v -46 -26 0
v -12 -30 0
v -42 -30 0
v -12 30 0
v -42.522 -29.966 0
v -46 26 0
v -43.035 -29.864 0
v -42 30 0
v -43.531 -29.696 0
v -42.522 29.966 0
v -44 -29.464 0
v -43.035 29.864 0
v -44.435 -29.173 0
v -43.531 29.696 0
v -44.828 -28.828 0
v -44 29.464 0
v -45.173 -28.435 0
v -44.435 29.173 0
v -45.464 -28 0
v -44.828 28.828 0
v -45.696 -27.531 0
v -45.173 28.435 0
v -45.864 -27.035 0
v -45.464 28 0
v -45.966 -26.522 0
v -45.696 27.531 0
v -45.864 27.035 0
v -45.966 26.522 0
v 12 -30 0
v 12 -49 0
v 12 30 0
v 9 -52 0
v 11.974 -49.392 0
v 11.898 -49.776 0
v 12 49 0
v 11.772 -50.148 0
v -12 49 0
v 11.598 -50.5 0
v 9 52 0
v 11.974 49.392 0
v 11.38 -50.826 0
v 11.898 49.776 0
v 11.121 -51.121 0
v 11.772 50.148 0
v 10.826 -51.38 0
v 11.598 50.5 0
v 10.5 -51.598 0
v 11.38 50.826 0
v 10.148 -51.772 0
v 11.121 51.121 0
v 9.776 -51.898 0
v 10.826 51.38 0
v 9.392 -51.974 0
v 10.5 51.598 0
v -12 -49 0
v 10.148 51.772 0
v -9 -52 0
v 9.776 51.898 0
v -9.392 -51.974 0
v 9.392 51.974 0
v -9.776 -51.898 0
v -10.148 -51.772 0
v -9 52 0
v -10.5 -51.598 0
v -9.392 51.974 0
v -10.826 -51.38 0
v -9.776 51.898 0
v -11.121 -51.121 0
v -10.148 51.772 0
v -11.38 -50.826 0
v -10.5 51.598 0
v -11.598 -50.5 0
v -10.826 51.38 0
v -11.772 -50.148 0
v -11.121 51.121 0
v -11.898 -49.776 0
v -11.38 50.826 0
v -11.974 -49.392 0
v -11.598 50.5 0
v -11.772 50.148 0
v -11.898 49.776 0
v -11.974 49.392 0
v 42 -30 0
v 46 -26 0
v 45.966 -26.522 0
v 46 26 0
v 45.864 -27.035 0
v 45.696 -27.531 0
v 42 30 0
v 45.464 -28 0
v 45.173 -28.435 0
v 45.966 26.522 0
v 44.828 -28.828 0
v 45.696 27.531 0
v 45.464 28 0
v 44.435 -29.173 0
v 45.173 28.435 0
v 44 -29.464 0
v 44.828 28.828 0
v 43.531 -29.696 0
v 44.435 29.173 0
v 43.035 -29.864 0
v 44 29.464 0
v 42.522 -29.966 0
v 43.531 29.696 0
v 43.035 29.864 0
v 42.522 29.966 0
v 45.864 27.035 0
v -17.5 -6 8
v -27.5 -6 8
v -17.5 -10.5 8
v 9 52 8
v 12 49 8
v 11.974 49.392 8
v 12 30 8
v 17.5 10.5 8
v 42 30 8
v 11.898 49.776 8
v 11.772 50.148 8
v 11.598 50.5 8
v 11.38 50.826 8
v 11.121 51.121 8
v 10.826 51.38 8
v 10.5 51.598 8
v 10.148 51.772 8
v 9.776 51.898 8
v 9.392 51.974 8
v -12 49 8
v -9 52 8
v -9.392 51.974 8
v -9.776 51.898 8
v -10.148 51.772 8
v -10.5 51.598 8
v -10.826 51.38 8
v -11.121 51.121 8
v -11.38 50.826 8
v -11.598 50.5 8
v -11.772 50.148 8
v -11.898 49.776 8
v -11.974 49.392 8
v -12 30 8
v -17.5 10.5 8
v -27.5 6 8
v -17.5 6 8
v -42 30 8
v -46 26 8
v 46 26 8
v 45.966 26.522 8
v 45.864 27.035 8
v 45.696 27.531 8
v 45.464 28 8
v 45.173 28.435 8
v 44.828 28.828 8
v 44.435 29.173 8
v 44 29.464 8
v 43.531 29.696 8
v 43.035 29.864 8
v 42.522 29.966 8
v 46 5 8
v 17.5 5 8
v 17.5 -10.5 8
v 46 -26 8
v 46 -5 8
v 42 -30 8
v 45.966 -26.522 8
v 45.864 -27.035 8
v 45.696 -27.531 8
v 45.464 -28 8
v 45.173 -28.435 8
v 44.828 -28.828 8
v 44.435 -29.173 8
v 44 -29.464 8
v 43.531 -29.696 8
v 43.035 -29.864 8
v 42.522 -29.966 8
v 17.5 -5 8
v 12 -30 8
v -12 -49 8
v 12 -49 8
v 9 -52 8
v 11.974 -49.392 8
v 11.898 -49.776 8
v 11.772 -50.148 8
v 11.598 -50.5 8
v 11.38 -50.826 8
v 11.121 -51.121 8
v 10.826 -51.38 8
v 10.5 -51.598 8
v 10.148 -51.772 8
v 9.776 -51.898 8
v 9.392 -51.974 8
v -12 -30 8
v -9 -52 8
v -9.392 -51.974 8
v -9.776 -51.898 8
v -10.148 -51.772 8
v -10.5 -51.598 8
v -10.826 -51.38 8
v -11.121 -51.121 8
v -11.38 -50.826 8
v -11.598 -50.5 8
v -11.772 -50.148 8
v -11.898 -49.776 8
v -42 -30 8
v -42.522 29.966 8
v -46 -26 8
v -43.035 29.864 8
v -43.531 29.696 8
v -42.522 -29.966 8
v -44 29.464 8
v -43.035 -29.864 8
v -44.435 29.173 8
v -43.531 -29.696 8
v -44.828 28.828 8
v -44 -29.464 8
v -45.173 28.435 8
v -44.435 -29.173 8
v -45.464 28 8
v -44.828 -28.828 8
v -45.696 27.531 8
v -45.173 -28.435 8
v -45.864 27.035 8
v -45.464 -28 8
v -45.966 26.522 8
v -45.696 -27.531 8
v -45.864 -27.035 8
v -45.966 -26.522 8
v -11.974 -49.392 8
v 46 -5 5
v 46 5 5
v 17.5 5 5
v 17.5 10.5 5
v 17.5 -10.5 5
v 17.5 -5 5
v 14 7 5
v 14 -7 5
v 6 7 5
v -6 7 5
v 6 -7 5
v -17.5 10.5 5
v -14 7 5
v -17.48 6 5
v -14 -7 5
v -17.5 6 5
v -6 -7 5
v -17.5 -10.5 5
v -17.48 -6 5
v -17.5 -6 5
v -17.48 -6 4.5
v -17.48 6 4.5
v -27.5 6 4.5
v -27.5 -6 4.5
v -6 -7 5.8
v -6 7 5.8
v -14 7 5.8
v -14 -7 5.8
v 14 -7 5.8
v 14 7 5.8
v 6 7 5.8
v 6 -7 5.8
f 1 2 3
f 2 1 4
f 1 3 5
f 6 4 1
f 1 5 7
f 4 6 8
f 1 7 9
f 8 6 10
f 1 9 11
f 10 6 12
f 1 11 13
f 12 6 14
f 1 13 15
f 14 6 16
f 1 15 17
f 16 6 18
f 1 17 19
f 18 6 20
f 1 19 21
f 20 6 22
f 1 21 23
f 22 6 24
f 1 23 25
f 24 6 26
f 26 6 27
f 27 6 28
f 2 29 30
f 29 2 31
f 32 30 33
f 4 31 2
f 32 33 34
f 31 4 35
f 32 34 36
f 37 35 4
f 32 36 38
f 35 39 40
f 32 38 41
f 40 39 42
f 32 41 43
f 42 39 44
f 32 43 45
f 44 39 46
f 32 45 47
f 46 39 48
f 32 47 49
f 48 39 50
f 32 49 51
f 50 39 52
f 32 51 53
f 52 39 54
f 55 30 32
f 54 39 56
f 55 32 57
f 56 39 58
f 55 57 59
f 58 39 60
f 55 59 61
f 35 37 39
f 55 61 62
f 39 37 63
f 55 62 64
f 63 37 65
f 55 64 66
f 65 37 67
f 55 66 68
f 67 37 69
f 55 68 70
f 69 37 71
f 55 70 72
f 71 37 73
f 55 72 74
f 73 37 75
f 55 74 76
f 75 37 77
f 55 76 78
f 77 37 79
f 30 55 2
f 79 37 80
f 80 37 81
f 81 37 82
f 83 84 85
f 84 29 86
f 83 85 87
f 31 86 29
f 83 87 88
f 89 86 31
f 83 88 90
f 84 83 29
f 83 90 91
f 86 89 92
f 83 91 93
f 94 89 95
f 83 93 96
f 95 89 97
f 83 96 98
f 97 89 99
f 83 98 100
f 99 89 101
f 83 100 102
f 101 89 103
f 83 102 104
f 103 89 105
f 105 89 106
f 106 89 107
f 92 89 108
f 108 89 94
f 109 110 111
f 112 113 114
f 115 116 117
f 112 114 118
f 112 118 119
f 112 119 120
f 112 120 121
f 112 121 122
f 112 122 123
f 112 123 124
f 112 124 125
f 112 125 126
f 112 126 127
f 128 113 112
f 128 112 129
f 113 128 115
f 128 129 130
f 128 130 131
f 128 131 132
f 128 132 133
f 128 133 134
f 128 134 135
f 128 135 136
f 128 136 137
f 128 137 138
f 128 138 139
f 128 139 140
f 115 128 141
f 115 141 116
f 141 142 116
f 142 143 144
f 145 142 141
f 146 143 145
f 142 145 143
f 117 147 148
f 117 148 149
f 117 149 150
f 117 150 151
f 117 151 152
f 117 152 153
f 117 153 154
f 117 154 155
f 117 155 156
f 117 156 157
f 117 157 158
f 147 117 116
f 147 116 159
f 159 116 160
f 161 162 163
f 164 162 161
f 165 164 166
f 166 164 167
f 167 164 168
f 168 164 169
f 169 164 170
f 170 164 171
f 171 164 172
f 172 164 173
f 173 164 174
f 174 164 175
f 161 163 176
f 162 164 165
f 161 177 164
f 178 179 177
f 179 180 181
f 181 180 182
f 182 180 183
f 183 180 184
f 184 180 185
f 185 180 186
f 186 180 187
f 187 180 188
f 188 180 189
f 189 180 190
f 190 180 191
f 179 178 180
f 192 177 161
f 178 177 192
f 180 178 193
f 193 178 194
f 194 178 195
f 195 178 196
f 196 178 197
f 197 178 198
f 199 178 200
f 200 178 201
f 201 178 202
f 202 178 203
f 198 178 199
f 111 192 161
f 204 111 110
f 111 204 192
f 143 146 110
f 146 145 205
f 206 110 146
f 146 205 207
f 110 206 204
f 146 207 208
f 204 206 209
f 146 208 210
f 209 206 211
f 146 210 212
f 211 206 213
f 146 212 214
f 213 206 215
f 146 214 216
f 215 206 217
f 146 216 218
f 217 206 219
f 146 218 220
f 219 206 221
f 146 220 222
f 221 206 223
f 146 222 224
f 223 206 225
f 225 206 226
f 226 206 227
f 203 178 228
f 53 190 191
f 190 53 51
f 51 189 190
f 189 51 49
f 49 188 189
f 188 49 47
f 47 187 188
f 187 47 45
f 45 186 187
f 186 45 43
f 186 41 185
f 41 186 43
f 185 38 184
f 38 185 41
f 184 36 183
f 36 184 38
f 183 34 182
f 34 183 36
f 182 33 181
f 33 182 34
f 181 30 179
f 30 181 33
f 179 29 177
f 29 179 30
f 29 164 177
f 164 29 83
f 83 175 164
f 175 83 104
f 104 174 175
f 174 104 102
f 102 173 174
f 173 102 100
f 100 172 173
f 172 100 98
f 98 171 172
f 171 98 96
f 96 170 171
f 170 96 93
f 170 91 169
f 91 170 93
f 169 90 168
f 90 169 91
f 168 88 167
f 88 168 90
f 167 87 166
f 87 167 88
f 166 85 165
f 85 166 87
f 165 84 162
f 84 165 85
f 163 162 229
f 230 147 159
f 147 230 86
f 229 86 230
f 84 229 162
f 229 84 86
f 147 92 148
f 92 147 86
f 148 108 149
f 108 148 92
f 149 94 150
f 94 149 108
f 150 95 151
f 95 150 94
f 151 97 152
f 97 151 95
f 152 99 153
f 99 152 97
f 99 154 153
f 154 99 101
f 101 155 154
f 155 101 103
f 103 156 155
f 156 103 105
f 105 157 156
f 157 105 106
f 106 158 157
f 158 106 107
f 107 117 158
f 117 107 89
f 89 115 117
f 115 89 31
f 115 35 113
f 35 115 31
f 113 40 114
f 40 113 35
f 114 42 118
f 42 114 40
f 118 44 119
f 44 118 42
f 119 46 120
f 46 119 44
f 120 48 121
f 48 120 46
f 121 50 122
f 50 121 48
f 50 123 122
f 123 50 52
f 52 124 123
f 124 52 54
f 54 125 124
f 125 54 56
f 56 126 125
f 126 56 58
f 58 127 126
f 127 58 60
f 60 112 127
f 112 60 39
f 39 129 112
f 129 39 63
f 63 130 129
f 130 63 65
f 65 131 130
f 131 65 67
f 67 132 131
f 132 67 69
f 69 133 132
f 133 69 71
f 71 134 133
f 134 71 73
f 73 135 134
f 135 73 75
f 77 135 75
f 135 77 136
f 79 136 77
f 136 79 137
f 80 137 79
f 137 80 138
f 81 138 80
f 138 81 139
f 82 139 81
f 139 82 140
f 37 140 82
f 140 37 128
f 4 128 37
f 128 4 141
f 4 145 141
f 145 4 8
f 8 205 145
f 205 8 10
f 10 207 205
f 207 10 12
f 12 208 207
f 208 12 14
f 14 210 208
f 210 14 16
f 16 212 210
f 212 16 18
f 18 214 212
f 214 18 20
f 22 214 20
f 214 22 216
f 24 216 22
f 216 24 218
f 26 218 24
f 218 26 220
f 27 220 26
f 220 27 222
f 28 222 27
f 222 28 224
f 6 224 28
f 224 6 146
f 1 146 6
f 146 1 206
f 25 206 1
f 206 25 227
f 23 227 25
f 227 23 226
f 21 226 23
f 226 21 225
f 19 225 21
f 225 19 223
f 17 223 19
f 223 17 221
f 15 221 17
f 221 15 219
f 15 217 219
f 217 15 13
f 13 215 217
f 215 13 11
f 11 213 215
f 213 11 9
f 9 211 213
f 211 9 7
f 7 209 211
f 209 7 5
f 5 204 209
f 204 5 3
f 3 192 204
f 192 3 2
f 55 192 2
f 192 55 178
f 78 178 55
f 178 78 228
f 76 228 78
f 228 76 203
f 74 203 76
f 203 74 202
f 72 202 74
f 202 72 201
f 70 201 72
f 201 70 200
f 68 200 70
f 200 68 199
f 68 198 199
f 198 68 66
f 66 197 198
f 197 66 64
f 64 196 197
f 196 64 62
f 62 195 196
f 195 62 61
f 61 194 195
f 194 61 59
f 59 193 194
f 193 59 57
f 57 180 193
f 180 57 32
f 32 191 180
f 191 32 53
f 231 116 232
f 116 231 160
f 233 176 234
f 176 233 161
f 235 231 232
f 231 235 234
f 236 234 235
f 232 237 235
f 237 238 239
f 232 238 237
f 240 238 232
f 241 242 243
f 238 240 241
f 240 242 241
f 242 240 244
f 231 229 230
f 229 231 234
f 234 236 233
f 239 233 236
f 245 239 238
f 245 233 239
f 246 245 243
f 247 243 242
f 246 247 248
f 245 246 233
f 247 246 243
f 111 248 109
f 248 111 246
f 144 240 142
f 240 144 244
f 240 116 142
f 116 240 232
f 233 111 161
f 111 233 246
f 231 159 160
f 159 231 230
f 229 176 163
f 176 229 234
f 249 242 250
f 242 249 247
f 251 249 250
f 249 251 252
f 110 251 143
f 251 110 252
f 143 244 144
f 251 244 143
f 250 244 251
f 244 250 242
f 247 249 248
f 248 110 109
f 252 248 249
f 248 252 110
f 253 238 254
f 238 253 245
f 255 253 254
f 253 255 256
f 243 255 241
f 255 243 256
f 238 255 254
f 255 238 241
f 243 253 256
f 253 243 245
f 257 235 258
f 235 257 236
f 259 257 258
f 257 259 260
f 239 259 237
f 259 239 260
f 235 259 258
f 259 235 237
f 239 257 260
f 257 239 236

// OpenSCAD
// Original shallow bench fixture; all dimensions in mm.
// Defaults are UNMEASURED example geometry, not a keystone compatibility claim.
part = "nest"; // [nest, contact_coupon]
base_length = 92;
base_width = 60;
base_thickness = 8;
base_radius = 4;
jack_length = 34;
jack_width = 20;
recess_depth = 3;
recess_clearance = 0.5; // Per side, loose location only.
support_land_width = 8; // X dimension of each raised bearing land.
support_land_length = 14; // Y dimension; both lands centered on Y=0.
support_land_spacing = 20; // X center-to-center separation.
support_land_height = 0.8;
cable_exit_width = 10;
latch_relief_width = 12;
latch_relief_length = 10; // Beyond the -X recess edge.
latch_relief_extra_depth = 0.5;
ear_width = 24; // X dimension.
ear_projection = 22; // Beyond each +/-Y edge of base.
ear_overlap = 8; // Join inside base; no holes or captive hardware.
ear_radius = 3;
clamp_pad_length = 14; // Actual pad X envelope, including pad articulation.
clamp_pad_width = 12; // Actual pad Y envelope.
clamp_pad_margin = 1;
coupon_length = 50;
coupon_width = 32;
// Measured lowest tool/hand working envelope above the bearing surface.
// The whole actual swept tool envelope must clear every fixture feature.
tool_bottom_above_support = 8;
tool_envelope_length = 40;
tool_envelope_width = 30;
minimum_floor = 3;
minimum_wall = 4;
minimum_land_width = 6;
minimum_land_length = 12;
minimum_ear_join = 4;
minimum_access_gap = 1;
$fn = 48;

cut_epsilon = 0.02;
recess_length = jack_length + 2 * recess_clearance;
recess_width = jack_width + 2 * recess_clearance;
floor_z = base_thickness - recess_depth;
support_z = floor_z + support_land_height;
ear_length = ear_projection + ear_overlap;

assert(part == "nest" || part == "contact_coupon", "part must be nest or contact_coupon");
assert(base_length > 0 && base_width > 0 && base_thickness > 0,
    "base dimensions must be positive");
assert(minimum_floor >= 3 && minimum_wall >= 4 && minimum_land_width >= 6 &&
    minimum_land_length >= 12 && minimum_ear_join >= 4 && minimum_access_gap >= 1,
    "minimum structural and access guards cannot be reduced");
assert(base_radius > 0 && base_radius < min(base_length, base_width) / 2,
    "base radius must preserve a straight-sided base");
assert(jack_length > 0 && jack_width > 0 && recess_depth > 0,
    "jack envelope and recess depth must be positive");
assert(recess_clearance > 0 && recess_clearance <= 2,
    "recess clearance must be positive and at most 2 mm per side");
assert(floor_z >= minimum_floor && floor_z - latch_relief_extra_depth >= minimum_floor,
    "recess and latch relief must preserve minimum floor");
assert(recess_length + 2 * (minimum_wall + base_radius) <= base_length &&
    recess_width + 2 * (minimum_wall + base_radius) <= base_width,
    "recess must preserve broad perimeter walls");
assert(support_land_width >= minimum_land_width && support_land_length >= minimum_land_length &&
    support_land_height > 0 && support_land_height <= recess_depth - minimum_access_gap,
    "support lands must retain broad bearing faces below locating walls");
assert(support_land_spacing > support_land_width &&
    support_land_spacing + support_land_width <= jack_length - 2 &&
    support_land_length <= jack_width - 2,
    "support lands must remain separated and inside housing footprint");
assert(cable_exit_width > 0 && cable_exit_width <= jack_width - 2,
    "cable exit must be open and narrower than housing");
assert(latch_relief_width > 0 && latch_relief_width <= jack_width - 2 &&
    latch_relief_length > 0 && latch_relief_extra_depth >= 0,
    "latch relief must be positive and inside housing width");
assert(latch_relief_length + recess_length / 2 <= base_length / 2 - minimum_wall,
    "latch relief must retain base end wall");
assert(ear_width > 0 && ear_projection > 0 && ear_overlap - ear_radius >= minimum_ear_join &&
    ear_overlap < base_width / 2 && ear_radius > 0 &&
    2 * ear_radius < min(ear_width, ear_length) &&
    ear_width + 2 * base_radius <= base_length,
    "ears must retain broad connected joins");
assert(clamp_pad_length > 0 && clamp_pad_width > 0 && clamp_pad_margin >= 1 &&
    ear_width - 2 * ear_radius >= clamp_pad_length + 2 * clamp_pad_margin &&
    ear_projection - 2 * ear_radius >= clamp_pad_width + 2 * clamp_pad_margin,
    "clamp pads must fit wholly on external ear flats");
assert(coupon_length >= recess_length + 2 * minimum_wall && coupon_length <= base_length &&
    coupon_width >= recess_width + 2 * minimum_wall && coupon_width <= base_width - 2 * base_radius,
    "contact coupon must retain recess walls and both lands");
assert(tool_envelope_length > 0 && tool_envelope_width > 0 &&
    tool_bottom_above_support > 0 &&
    support_z + tool_bottom_above_support >= base_thickness + minimum_access_gap,
    "tool envelope must clear fixture top by minimum access gap");

module rounded_outline(length, width, radius) {
    hull() for (x = [-length / 2 + radius, length / 2 - radius])
        for (y = [-width / 2 + radius, width / 2 - radius])
            translate([x, y]) circle(r = radius);
}

module stock() {
    linear_extrude(base_thickness) union() {
        rounded_outline(base_length, base_width, base_radius);
        for (side = [-1, 1])
            translate([0, side * (base_width / 2 + (ear_projection - ear_overlap) / 2)])
                rounded_outline(ear_width, ear_length, ear_radius);
    }
}

module nest() {
    union() {
        difference() {
            stock();
            // Flat continuous floor backs two raised housing bearing lands.
            translate([-recess_length / 2, -recess_width / 2, floor_z])
                cube([recess_length, recess_width, recess_depth + cut_epsilon]);
            // +X cable channel opens through the outer base edge.
            translate([recess_length / 2 - cut_epsilon, -cable_exit_width / 2, floor_z])
                cube([base_length / 2 + cut_epsilon, cable_exit_width, recess_depth + cut_epsilon]);
            // -X latch pocket is deeper than the contact floor and never a latch stop.
            translate([-recess_length / 2 - latch_relief_length, -latch_relief_width / 2,
                floor_z - latch_relief_extra_depth])
                cube([latch_relief_length + cut_epsilon, latch_relief_width,
                    recess_depth + latch_relief_extra_depth + cut_epsilon]);
        }
        for (side = [-1, 1])
            translate([side * support_land_spacing / 2 - support_land_width / 2,
                -support_land_length / 2, floor_z - cut_epsilon])
                cube([support_land_width, support_land_length, support_land_height + cut_epsilon]);
    }
}

if (part == "contact_coupon") {
    // Exact-source crop: both contact lands, full recess width, open channel stubs.
    intersection() {
        nest();
        translate([-coupon_length / 2, -coupon_width / 2, -cut_epsilon])
            cube([coupon_length, coupon_width, base_thickness + 2 * cut_epsilon]);
    }
} else nest();
